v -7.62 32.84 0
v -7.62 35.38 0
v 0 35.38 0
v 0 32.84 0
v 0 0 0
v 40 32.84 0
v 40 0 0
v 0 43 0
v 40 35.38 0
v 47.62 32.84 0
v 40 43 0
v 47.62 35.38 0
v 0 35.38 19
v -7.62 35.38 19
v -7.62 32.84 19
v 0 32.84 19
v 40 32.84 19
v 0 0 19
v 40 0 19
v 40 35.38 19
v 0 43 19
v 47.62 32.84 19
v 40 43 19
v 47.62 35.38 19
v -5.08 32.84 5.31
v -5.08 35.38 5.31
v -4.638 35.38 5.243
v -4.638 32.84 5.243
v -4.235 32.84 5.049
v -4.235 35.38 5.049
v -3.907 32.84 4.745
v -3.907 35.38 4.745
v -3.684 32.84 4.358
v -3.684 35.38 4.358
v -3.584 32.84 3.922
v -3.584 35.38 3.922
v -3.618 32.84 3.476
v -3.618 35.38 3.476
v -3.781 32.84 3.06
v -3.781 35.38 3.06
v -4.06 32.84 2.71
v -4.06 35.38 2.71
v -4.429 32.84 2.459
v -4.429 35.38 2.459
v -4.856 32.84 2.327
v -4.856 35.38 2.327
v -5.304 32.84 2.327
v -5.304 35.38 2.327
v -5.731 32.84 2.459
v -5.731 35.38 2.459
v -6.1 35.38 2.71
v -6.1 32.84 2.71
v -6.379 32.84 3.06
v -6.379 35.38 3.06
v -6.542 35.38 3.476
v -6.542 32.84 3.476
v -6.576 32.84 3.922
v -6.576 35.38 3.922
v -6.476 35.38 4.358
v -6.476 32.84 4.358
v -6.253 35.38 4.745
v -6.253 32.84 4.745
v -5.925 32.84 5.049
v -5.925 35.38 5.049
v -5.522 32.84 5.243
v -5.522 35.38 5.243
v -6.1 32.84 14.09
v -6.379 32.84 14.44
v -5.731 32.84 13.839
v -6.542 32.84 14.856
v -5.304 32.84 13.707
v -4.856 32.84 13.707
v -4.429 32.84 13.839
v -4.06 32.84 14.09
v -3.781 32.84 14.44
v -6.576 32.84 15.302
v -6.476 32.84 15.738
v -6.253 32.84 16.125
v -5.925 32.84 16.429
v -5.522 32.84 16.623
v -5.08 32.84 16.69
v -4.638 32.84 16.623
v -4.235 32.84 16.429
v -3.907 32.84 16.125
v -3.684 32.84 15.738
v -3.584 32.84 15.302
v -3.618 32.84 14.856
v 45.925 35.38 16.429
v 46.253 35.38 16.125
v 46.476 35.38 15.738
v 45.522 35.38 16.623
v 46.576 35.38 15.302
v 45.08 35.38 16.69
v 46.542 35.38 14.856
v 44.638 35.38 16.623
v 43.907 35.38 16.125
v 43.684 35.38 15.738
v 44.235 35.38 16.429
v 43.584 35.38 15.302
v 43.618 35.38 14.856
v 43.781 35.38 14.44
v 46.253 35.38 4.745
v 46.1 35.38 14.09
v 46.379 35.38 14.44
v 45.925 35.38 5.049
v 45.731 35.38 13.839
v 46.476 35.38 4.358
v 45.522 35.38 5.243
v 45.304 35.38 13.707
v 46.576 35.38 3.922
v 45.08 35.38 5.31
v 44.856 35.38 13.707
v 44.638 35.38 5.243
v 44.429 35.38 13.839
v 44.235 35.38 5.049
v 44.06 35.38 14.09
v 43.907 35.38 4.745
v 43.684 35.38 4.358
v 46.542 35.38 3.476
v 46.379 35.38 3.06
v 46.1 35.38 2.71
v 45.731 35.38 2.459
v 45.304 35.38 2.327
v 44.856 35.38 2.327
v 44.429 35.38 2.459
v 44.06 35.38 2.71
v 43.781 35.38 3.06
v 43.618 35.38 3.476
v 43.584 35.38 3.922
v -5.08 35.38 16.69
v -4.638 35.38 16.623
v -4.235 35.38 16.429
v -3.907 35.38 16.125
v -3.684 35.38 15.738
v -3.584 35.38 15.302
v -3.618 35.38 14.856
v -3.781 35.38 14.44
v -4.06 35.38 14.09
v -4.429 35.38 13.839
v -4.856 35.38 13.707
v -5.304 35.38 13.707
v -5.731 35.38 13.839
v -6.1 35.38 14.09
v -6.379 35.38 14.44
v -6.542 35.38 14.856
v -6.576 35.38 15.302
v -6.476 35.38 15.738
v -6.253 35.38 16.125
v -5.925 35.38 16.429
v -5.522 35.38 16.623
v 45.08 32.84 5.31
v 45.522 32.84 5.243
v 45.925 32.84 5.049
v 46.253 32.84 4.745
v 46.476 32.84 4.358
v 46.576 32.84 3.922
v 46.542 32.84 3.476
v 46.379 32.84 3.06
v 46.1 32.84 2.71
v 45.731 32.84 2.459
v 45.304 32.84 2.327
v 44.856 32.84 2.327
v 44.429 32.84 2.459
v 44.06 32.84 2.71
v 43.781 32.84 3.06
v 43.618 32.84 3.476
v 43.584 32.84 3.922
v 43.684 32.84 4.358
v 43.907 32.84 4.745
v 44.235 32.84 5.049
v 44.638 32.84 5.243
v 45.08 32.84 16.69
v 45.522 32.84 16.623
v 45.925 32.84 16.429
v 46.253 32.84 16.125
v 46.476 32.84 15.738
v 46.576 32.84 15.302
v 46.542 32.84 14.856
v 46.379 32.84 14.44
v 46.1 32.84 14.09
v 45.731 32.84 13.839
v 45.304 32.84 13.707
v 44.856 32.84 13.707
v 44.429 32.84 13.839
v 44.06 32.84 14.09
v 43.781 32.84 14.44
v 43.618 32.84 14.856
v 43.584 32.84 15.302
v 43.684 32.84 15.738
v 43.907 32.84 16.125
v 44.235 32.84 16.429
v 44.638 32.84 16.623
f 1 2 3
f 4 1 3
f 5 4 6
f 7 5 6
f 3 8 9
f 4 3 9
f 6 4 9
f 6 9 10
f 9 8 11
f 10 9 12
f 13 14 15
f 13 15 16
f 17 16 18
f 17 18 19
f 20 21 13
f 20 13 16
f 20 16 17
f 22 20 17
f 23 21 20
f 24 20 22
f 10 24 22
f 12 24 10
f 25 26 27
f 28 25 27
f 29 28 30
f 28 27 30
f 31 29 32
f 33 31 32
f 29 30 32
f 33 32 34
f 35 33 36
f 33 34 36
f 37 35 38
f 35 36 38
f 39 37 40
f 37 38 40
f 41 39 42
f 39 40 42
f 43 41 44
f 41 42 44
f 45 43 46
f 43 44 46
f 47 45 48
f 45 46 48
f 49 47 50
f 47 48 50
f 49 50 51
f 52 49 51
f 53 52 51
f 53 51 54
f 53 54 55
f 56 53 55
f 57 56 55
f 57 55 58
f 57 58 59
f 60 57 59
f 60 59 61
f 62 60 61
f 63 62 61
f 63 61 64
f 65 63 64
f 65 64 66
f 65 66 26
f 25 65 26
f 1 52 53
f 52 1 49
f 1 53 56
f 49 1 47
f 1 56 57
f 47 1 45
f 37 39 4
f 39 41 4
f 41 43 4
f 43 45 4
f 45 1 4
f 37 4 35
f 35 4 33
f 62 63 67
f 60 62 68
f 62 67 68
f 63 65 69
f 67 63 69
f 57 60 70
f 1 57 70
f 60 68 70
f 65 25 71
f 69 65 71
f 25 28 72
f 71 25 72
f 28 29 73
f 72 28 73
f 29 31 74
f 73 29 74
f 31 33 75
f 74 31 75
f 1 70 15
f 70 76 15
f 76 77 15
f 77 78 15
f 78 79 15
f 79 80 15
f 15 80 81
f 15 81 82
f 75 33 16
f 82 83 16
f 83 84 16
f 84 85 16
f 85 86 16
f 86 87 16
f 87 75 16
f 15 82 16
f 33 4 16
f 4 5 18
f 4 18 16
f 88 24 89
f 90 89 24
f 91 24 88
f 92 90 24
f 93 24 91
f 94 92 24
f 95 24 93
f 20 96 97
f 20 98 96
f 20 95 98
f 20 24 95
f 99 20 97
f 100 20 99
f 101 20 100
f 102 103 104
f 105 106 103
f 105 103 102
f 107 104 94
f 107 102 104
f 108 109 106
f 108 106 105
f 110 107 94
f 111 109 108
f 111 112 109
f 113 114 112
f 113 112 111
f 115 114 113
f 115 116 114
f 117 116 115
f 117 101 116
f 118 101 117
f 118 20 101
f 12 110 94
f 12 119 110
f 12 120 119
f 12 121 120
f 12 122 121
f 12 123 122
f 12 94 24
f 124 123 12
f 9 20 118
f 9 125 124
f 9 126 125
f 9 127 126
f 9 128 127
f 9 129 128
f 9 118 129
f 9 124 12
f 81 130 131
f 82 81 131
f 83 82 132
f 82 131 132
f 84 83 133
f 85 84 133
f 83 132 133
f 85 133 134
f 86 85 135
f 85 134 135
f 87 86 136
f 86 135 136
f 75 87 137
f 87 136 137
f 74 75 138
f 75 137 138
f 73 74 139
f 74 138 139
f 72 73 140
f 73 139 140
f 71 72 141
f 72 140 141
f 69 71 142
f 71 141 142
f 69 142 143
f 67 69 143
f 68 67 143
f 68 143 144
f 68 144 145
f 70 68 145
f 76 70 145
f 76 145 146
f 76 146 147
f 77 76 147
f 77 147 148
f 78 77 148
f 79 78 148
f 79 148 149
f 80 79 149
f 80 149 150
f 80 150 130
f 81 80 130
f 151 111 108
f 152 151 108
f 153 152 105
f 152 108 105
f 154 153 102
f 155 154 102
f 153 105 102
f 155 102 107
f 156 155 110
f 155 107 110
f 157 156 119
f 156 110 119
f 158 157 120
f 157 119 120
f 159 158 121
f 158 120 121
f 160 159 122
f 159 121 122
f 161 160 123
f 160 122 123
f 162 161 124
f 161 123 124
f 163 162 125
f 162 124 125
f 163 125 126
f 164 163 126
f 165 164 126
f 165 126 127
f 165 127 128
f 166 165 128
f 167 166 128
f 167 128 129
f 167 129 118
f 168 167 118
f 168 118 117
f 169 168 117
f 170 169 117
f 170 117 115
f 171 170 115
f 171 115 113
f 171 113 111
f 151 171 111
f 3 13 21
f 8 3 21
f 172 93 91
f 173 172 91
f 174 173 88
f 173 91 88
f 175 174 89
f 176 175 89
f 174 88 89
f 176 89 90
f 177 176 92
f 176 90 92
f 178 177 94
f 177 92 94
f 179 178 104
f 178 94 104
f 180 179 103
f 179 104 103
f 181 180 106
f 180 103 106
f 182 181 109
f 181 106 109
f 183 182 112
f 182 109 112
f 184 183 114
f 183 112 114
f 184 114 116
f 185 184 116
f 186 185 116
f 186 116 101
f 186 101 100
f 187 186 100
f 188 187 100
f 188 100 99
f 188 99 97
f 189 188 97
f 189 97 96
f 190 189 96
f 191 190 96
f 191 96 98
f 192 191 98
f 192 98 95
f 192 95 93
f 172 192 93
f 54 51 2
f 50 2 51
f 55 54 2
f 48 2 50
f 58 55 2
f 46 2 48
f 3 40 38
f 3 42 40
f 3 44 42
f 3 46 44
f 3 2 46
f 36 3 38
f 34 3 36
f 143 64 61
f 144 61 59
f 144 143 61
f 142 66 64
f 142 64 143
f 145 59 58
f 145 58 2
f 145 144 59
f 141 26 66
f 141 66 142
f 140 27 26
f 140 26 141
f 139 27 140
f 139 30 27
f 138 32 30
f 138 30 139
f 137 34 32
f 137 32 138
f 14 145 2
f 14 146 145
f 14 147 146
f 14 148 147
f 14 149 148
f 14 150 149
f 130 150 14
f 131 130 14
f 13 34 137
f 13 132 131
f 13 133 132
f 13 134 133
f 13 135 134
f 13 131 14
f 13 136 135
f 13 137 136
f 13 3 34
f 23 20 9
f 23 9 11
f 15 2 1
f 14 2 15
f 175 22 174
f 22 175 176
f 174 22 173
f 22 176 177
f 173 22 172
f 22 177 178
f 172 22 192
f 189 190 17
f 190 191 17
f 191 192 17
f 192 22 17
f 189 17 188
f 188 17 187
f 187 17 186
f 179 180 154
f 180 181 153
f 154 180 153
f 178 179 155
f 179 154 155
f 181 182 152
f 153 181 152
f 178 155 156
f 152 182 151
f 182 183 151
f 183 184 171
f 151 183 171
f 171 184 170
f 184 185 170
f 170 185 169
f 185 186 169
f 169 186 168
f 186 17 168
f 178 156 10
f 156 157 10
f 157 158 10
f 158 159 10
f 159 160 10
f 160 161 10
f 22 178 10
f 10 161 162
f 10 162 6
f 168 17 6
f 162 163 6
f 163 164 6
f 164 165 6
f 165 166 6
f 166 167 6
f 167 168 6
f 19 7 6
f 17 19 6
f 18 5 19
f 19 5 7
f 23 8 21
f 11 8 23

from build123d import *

# Parameters (mm, degrees)
SKETCH1_W           = 40
SKETCH1_H           = 43
BOSS_EXTRUDE1_DEPTH = 19
SKETCH2_W           = 19
SKETCH2_H           = 2.54
BOSS_EXTRUDE2_DEPTH = 7.62
SKETCH3_R           = 1.5
CUT_EXTRUDE1_DEPTH  = 63.292927367
SKETCH4_W           = 19
SKETCH4_H           = 2.54
BOSS_EXTRUDE3_DEPTH = 7.62
SKETCH5_R           = 1.5
CUT_EXTRUDE2_DEPTH  = 63.292927367


with BuildPart() as part:
    # Sketch1 → Boss-Extrude1 (new body)
    with BuildSketch(Plane.XY):
        with Locations((20, 21.5)):
            Rectangle(SKETCH1_W, SKETCH1_H)
    extrude(amount=BOSS_EXTRUDE1_DEPTH)

    # Sketch2 → Boss-Extrude2 (add)
    with BuildSketch(Plane(origin=(40, 0, 0), x_dir=(0, 0, -1), z_dir=(1, 0, 0))):
        with Locations((-9.5, 34.11)):
            Rectangle(SKETCH2_W, SKETCH2_H)
    extrude(amount=BOSS_EXTRUDE2_DEPTH)

    # Sketch3 → Cut-Extrude1 (cut, through all)
    with BuildSketch(Plane(origin=(0, 35.38, 0), x_dir=(1, 0, 0), z_dir=(0, 1, 0))):
        with Locations(Location((45.08, -3.81, 0), (0, 0, 270))):
            Circle(SKETCH3_R)
        with Locations(Location((45.08, -15.19, 0), (0, 0, 270))):
            Circle(SKETCH3_R)
    extrude(amount=-CUT_EXTRUDE1_DEPTH, mode=Mode.SUBTRACT)

    # Sketch4 → Boss-Extrude3 (add)
    with BuildSketch(Plane.ZY):
        with Locations((9.5, 34.11)):
            Rectangle(SKETCH4_W, SKETCH4_H)
    extrude(amount=BOSS_EXTRUDE3_DEPTH)

    # Sketch5 → Cut-Extrude2 (cut, through all)
    with BuildSketch(Plane(origin=(0, 35.38, 0), x_dir=(1, 0, 0), z_dir=(0, 1, 0))):
        with Locations(Location((-5.08, -3.81, 0), (0, 0, 270))):
            Circle(SKETCH5_R)
        with Locations(Location((-5.08, -15.19, 0), (0, 0, 270))):
            Circle(SKETCH5_R)
    extrude(amount=-CUT_EXTRUDE2_DEPTH, mode=Mode.SUBTRACT)


solid = part.part
